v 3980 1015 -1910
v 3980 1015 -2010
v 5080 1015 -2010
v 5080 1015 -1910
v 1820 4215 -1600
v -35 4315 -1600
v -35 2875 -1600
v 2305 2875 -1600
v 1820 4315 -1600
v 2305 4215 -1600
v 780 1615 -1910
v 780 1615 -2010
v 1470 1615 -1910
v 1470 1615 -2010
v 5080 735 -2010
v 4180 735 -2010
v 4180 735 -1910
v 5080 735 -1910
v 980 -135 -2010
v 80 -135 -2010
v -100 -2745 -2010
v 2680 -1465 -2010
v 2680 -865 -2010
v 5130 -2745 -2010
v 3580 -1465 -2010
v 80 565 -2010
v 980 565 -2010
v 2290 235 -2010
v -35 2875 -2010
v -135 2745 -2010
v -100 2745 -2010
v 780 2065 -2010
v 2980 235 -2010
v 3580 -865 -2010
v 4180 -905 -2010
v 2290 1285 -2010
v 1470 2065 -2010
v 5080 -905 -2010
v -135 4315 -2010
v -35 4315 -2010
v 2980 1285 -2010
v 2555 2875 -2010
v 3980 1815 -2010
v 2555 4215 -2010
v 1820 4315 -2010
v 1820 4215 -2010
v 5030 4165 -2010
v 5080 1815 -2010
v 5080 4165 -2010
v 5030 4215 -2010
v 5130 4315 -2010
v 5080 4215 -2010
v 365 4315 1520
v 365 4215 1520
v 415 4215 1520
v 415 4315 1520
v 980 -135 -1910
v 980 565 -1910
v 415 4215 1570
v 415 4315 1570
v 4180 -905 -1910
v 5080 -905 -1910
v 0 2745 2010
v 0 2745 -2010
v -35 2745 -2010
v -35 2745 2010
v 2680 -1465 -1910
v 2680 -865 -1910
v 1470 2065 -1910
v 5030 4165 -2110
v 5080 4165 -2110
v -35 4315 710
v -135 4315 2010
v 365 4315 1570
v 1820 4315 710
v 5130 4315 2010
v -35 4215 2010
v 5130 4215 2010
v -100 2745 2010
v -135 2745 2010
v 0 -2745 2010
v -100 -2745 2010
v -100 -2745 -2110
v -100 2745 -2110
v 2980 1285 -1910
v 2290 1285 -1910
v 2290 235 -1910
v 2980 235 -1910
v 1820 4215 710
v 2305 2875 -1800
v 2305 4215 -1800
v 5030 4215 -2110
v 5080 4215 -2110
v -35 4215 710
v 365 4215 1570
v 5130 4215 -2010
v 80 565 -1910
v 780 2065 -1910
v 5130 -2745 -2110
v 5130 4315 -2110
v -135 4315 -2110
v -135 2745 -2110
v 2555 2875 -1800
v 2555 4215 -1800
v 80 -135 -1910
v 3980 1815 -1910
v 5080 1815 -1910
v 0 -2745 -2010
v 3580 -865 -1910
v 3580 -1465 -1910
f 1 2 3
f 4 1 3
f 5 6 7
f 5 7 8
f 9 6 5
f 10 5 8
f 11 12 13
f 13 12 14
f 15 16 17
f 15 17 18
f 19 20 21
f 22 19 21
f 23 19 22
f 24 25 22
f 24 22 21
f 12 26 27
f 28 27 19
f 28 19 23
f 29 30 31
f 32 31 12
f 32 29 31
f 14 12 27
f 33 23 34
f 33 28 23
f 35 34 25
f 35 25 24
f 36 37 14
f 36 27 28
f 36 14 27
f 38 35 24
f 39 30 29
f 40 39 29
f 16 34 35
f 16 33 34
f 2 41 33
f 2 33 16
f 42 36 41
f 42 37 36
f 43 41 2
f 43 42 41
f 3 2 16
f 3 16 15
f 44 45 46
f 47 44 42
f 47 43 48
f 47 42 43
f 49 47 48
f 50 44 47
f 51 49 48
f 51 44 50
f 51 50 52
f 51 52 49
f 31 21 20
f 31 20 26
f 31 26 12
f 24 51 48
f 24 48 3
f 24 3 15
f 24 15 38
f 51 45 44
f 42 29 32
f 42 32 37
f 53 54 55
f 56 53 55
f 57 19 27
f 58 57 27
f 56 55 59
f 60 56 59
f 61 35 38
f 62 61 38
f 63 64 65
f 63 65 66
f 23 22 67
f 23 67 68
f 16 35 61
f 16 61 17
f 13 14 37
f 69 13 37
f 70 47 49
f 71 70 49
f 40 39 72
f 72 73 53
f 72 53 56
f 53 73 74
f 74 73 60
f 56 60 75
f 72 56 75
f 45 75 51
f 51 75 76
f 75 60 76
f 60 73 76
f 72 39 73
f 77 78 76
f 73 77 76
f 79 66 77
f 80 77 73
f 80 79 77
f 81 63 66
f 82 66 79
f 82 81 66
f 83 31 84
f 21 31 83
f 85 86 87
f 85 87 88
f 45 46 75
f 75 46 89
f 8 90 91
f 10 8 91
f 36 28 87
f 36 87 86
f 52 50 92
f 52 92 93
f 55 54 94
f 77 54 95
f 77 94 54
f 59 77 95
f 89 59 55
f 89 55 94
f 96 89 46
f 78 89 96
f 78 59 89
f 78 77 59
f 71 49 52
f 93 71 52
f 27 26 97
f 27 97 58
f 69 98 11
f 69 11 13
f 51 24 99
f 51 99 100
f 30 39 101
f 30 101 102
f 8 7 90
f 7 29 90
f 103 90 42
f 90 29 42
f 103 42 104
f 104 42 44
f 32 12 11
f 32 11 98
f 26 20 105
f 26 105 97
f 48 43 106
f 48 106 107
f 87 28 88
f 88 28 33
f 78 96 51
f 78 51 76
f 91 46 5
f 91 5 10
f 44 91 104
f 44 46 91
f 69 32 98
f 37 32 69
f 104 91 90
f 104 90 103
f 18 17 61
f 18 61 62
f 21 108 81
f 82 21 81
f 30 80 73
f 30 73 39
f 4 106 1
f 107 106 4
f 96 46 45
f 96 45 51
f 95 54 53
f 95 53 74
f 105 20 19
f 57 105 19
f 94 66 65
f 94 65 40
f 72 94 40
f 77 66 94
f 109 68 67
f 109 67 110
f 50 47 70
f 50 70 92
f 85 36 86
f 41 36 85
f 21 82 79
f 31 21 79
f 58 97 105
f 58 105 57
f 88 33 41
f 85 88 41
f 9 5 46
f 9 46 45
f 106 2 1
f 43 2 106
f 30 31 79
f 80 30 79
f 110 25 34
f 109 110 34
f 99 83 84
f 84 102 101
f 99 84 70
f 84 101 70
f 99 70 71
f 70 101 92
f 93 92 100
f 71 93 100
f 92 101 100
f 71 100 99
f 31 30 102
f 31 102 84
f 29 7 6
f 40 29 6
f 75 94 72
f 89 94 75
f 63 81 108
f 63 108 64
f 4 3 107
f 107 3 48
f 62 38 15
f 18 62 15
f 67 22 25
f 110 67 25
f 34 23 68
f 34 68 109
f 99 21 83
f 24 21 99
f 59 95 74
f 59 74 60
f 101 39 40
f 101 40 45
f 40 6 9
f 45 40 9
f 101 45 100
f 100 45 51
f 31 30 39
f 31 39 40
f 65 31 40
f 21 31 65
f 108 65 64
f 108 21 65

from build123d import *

# Parameters (mm, degrees)
F0_W      = 5490
F0_H      = 4020
F1_DEPTH  = 100
F3_W      = 1470
F3_H      = 4020
F4_DEPTH  = 100
F6_W      = 1855
F6_H      = 2720
F7_DEPTH  = 100
F8_W      = 1855
F8_H      = 2720
F9_DEPTH  = 100
F12_DEPTH = 100
F13_W     = 1100
F13_H     = 800
F13_W_2   = 900
F13_H_2   = 1640
F13_H_3   = 600
F13_W_3   = 690
F13_H_4   = 1050
F13_H_5   = 700
F13_H_6   = 450
F14_DEPTH = 100
F15_W     = 2590
F15_H     = 1340
F16_DEPTH = 210
F17_W     = 2340
F17_H     = 1340
F18_DEPTH = 200
F19_W     = 1855
F19_H     = 100
F20_DEPTH = 510
F23_W     = 50
F23_H     = 50
F24_DEPTH = 100
F25_W     = 50
F25_H     = 50
F26_DEPTH = 100


with BuildPart() as f1:
    # F0 (on Right) → F1 (new body)
    with BuildSketch(Plane.YZ):
        Rectangle(F0_W, F0_H)
    extrude(amount=-F1_DEPTH)

    # F3 (on offset) → F4 (join)
    with BuildSketch(Plane.YZ.offset(-35)):
        with Locations((3480, 0)):
            Rectangle(F3_W, F3_H)
    extrude(amount=-F4_DEPTH)

    # F6 (on offset) → F7 (join)
    with BuildSketch(Plane.XZ.offset(-4215)):
        Polygon((5130, 2010), (-35, 2010), (-35, 710), (1820, 710), (1820, -2010), (5130, -2010), align=None)
        Polygon((-35, 710), (-35, 2010), (-135, 2010), (-135, -2010), (-35, -2010), align=None)
        with Locations((892.5, -650)):
            Rectangle(F6_W, F6_H)
    extrude(amount=-F7_DEPTH)

    # F8 (on face) → F9 (cut)
    with BuildSketch(Plane.XZ.offset(-4215)):
        with Locations((892.5, -650)):
            Rectangle(F8_W, F8_H)
    extrude(amount=-F9_DEPTH, mode=Mode.SUBTRACT)

    # F25 (on face) → F26 (cut)
    with BuildSketch(Plane.XZ.offset(-4215)):
        with Locations((390, 1545)):
            Rectangle(F25_W, F25_H)
    extrude(amount=-F26_DEPTH, mode=Mode.SUBTRACT)


with BuildPart() as f12:
    # F11 (on offset) → F12 (new body)
    with BuildSketch(Plane.XY.offset(-2010)):
        Polygon((-100, 2745), (-100, -2745), (0, -2745), (5130, -2745), (5130, 4215), (5130, 4315), (1820, 4315), (-35, 4315), (-135, 4315), (-135, 2745), align=None)
    extrude(amount=-F12_DEPTH)

    # F13 (on face) → F14 (join)
    with BuildSketch(Plane.XY.offset(-2010)):
        with Locations((4530, 1415)):
            Rectangle(F13_W, F13_H)
        with Locations((4630, -85)):
            Rectangle(F13_W_2, F13_H_2)
        with Locations((3130, -1165)):
            Rectangle(F13_W_2, F13_H_3)
        with Locations((2635, 760)):
            Rectangle(F13_W_3, F13_H_4)
        with Locations((530, 215)):
            Rectangle(F13_W_2, F13_H_5)
        with Locations((1125, 1840)):
            Rectangle(F13_W_3, F13_H_6)
    extrude(amount=F14_DEPTH)

    # F15 (on face) → F16 (join)
    with BuildSketch(Plane.XY.offset(-2010)):
        with Locations((1260, 3545)):
            Rectangle(F15_W, F15_H)
    extrude(amount=F16_DEPTH)

    # F17 (on face) → F18 (join)
    with BuildSketch(Plane.XY.offset(-1800)):
        with Locations((1135, 3545)):
            Rectangle(F17_W, F17_H)
    extrude(amount=F18_DEPTH)

    # F19 (on face) → F20 (join)
    with BuildSketch(Plane.XY.offset(-1600)):
        with Locations((892.5, 4265)):
            Rectangle(F19_W, F19_H)
    extrude(amount=-F20_DEPTH)

    # F21: union 

    # F23 (on face) → F24 (cut)
    with BuildSketch(Plane.XY.offset(-2010)):
        with Locations((5055, 4190)):
            Rectangle(F23_W, F23_H)
    extrude(amount=-F24_DEPTH, mode=Mode.SUBTRACT)


solid = Compound([f1.part, f12.part])
